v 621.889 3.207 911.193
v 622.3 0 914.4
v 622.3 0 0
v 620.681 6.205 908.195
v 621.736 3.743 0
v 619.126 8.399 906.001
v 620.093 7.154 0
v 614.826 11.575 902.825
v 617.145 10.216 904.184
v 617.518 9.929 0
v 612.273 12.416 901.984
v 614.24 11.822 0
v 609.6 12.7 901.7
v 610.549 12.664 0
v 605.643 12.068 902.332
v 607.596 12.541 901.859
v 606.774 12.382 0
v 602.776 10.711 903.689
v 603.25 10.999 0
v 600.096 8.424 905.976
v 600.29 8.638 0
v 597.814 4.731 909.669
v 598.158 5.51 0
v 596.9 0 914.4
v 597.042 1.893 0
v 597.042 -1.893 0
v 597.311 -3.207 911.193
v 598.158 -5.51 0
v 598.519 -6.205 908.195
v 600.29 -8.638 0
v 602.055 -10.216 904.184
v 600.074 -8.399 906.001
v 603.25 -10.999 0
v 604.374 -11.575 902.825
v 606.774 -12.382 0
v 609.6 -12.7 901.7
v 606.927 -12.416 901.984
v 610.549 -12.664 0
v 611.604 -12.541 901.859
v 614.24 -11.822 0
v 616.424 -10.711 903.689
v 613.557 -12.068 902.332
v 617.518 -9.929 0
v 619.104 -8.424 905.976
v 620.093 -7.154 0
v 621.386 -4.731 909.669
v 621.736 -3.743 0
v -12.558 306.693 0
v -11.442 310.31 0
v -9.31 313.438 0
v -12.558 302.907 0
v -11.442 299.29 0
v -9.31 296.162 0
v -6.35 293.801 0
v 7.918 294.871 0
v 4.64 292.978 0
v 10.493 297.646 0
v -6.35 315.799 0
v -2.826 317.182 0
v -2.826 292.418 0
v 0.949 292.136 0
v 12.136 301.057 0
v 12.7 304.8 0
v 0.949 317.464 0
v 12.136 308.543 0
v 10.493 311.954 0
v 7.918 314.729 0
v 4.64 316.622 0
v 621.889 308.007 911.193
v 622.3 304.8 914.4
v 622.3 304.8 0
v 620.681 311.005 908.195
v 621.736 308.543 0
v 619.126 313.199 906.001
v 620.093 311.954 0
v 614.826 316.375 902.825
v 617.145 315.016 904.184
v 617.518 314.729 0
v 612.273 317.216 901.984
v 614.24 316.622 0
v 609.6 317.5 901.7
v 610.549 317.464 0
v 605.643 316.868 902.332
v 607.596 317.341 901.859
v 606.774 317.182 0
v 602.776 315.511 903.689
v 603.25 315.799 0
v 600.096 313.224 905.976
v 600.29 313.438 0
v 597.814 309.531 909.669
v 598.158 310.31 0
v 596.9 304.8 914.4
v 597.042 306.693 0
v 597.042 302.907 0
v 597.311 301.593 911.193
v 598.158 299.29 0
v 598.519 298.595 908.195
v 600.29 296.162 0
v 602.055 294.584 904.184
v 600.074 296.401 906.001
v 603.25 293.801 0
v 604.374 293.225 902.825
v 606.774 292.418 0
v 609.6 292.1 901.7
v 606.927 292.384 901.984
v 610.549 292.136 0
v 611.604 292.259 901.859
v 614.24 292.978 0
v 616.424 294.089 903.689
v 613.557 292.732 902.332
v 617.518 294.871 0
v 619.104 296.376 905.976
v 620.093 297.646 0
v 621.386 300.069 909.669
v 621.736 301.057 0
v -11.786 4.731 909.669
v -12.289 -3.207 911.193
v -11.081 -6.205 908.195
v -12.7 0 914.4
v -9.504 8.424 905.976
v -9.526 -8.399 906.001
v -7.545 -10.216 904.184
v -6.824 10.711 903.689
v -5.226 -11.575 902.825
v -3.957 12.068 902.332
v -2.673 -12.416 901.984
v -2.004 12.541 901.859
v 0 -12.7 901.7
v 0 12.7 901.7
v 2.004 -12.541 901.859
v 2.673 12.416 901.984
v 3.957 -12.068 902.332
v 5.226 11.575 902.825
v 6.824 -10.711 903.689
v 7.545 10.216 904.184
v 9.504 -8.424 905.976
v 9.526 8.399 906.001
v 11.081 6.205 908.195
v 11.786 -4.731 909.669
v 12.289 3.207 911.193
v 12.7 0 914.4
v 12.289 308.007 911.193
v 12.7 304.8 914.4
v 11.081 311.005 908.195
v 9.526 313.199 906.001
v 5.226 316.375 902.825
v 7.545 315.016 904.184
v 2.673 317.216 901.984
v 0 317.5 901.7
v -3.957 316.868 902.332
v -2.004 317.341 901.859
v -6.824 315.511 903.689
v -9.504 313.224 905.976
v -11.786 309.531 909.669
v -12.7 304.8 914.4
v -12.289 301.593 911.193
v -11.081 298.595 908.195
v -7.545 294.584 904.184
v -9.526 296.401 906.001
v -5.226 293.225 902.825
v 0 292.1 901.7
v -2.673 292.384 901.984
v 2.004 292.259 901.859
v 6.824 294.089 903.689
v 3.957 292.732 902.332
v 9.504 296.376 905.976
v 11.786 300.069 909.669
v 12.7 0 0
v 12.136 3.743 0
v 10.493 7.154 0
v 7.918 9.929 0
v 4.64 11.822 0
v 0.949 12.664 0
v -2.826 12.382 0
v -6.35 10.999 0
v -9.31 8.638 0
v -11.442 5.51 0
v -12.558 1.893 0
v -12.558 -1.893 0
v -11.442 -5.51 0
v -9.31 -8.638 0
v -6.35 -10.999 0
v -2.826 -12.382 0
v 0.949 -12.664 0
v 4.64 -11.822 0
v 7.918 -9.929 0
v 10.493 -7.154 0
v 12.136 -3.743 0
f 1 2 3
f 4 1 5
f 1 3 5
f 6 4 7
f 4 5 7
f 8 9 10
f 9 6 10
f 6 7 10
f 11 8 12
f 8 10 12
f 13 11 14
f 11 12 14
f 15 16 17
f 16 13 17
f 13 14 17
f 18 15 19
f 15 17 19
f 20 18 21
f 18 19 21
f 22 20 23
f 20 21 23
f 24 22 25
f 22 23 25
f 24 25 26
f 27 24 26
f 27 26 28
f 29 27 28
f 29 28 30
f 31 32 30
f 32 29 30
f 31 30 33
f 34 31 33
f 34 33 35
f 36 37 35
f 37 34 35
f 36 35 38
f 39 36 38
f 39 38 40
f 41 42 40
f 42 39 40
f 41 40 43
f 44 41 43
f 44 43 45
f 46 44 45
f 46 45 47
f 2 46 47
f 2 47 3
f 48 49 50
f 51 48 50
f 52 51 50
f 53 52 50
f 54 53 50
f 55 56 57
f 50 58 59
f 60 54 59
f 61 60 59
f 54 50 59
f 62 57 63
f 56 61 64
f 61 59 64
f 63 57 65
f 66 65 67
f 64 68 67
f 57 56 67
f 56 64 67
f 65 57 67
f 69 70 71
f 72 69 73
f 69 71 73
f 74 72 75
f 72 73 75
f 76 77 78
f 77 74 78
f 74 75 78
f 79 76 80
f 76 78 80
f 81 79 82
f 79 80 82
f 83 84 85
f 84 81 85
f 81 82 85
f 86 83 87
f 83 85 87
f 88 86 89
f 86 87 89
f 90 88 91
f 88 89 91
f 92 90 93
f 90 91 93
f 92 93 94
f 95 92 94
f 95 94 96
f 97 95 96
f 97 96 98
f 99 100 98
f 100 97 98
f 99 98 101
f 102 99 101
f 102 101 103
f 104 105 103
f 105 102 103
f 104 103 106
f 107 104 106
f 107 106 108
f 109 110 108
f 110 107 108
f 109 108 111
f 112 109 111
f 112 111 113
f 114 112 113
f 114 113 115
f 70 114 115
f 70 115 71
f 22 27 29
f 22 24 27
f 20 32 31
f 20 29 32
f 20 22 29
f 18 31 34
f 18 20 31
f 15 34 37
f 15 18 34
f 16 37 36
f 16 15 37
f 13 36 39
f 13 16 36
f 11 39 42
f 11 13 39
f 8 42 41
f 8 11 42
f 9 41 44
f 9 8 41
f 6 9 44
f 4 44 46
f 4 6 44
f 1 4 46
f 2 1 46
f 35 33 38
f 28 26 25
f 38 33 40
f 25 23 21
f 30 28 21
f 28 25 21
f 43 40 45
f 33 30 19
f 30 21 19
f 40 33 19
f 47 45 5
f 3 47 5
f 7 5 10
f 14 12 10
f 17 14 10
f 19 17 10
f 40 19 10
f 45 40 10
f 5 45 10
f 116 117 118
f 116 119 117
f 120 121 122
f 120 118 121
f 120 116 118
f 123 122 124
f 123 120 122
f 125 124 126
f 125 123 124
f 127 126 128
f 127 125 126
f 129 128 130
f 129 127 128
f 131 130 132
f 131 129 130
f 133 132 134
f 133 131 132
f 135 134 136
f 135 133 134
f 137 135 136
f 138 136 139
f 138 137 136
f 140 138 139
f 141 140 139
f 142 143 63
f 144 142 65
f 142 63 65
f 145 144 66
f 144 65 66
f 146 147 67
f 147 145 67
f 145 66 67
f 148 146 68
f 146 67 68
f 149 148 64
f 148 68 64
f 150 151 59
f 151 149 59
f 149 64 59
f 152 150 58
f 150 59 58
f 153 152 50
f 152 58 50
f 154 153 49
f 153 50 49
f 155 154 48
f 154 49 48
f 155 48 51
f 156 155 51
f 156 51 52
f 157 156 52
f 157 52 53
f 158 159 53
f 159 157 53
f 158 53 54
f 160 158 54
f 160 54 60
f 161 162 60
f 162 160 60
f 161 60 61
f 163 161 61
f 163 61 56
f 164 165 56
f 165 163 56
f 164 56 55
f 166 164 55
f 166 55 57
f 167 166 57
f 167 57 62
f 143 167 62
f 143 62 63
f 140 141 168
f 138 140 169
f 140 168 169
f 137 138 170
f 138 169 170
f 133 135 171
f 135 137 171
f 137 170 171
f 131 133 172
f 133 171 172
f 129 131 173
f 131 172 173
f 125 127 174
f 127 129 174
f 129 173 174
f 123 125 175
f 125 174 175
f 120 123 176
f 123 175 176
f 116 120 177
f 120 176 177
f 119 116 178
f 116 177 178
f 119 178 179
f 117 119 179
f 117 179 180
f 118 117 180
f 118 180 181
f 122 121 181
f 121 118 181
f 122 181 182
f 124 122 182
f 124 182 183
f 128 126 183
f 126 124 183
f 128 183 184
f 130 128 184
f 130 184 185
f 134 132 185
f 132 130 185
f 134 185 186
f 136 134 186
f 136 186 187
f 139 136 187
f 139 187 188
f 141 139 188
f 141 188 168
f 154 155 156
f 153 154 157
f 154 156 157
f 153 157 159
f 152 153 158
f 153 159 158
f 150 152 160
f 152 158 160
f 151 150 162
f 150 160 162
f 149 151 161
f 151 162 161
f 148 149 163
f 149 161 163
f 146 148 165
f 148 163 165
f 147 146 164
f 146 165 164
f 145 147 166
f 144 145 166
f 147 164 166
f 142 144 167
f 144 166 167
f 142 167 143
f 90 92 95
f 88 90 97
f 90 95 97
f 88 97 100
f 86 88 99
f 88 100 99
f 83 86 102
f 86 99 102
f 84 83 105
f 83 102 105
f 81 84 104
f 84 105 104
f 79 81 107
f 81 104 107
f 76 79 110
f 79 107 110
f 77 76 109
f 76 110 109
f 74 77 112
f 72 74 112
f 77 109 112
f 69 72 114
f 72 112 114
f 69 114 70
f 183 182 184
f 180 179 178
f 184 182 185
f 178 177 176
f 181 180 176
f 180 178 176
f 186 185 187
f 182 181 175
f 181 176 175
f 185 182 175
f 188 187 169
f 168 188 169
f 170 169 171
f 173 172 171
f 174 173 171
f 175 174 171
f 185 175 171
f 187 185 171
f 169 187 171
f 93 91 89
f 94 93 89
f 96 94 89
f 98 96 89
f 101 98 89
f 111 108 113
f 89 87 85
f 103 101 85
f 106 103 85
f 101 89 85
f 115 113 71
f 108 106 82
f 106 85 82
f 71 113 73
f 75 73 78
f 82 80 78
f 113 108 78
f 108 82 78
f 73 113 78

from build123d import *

# Parameters (mm, degrees)
F0_R          = 12.7
F1_DEPTH      = 914.4
F2_R          = 12.7
F3_DEPTH      = 317.501
F3_DEPTH_BACK = 12.701


with BuildPart() as f1:
    # F0 (on Top) → F1 (new body)
    with BuildSketch(Plane.XY):
        with Locations((0, 304.8)):
            Circle(F0_R)
    extrude(amount=F1_DEPTH)


with BuildPart() as f1b:
    # F0 (on Top) → F1, piece 2 (new body)
    with BuildSketch(Plane.XY):
        Circle(F0_R)
    extrude(amount=F1_DEPTH)


with BuildPart() as f1c:
    # F0 (on Top) → F1, piece 3 (new body)
    with BuildSketch(Plane.XY):
        with Locations((609.6, 304.8)):
            Circle(F0_R)
    extrude(amount=F1_DEPTH)


with BuildPart() as f1d:
    # F0 (on Top) → F1, piece 4 (new body)
    with BuildSketch(Plane.XY):
        with Locations((609.6, 0)):
            Circle(F0_R)
    extrude(amount=F1_DEPTH)


with BuildPart() as f3_tool:
    # F2 (on Front) → F3 (new body, two sides)
    with BuildSketch(Plane.XZ) as f3_sk:
        with Locations((0, 914.4)):
            Circle(F2_R)
        with Locations((609.6, 914.4)):
            Circle(F2_R)
    extrude(amount=-F3_DEPTH)
    extrude(f3_sk.sketch, amount=F3_DEPTH_BACK)


with BuildPart() as f1_1:
    add(f1.part)

    # F3: cut by f3_tool
    add(f3_tool.part, mode=Mode.SUBTRACT)


with BuildPart() as f1b_1:
    add(f1b.part)

    # F3: cut by f3_tool
    add(f3_tool.part, mode=Mode.SUBTRACT)


with BuildPart() as f1c_1:
    add(f1c.part)

    # F3: cut by f3_tool
    add(f3_tool.part, mode=Mode.SUBTRACT)


with BuildPart() as f1d_1:
    add(f1d.part)

    # F3: cut by f3_tool
    add(f3_tool.part, mode=Mode.SUBTRACT)


solid = Compound([f1_1.part, f1b_1.part, f1c_1.part, f1d_1.part])
